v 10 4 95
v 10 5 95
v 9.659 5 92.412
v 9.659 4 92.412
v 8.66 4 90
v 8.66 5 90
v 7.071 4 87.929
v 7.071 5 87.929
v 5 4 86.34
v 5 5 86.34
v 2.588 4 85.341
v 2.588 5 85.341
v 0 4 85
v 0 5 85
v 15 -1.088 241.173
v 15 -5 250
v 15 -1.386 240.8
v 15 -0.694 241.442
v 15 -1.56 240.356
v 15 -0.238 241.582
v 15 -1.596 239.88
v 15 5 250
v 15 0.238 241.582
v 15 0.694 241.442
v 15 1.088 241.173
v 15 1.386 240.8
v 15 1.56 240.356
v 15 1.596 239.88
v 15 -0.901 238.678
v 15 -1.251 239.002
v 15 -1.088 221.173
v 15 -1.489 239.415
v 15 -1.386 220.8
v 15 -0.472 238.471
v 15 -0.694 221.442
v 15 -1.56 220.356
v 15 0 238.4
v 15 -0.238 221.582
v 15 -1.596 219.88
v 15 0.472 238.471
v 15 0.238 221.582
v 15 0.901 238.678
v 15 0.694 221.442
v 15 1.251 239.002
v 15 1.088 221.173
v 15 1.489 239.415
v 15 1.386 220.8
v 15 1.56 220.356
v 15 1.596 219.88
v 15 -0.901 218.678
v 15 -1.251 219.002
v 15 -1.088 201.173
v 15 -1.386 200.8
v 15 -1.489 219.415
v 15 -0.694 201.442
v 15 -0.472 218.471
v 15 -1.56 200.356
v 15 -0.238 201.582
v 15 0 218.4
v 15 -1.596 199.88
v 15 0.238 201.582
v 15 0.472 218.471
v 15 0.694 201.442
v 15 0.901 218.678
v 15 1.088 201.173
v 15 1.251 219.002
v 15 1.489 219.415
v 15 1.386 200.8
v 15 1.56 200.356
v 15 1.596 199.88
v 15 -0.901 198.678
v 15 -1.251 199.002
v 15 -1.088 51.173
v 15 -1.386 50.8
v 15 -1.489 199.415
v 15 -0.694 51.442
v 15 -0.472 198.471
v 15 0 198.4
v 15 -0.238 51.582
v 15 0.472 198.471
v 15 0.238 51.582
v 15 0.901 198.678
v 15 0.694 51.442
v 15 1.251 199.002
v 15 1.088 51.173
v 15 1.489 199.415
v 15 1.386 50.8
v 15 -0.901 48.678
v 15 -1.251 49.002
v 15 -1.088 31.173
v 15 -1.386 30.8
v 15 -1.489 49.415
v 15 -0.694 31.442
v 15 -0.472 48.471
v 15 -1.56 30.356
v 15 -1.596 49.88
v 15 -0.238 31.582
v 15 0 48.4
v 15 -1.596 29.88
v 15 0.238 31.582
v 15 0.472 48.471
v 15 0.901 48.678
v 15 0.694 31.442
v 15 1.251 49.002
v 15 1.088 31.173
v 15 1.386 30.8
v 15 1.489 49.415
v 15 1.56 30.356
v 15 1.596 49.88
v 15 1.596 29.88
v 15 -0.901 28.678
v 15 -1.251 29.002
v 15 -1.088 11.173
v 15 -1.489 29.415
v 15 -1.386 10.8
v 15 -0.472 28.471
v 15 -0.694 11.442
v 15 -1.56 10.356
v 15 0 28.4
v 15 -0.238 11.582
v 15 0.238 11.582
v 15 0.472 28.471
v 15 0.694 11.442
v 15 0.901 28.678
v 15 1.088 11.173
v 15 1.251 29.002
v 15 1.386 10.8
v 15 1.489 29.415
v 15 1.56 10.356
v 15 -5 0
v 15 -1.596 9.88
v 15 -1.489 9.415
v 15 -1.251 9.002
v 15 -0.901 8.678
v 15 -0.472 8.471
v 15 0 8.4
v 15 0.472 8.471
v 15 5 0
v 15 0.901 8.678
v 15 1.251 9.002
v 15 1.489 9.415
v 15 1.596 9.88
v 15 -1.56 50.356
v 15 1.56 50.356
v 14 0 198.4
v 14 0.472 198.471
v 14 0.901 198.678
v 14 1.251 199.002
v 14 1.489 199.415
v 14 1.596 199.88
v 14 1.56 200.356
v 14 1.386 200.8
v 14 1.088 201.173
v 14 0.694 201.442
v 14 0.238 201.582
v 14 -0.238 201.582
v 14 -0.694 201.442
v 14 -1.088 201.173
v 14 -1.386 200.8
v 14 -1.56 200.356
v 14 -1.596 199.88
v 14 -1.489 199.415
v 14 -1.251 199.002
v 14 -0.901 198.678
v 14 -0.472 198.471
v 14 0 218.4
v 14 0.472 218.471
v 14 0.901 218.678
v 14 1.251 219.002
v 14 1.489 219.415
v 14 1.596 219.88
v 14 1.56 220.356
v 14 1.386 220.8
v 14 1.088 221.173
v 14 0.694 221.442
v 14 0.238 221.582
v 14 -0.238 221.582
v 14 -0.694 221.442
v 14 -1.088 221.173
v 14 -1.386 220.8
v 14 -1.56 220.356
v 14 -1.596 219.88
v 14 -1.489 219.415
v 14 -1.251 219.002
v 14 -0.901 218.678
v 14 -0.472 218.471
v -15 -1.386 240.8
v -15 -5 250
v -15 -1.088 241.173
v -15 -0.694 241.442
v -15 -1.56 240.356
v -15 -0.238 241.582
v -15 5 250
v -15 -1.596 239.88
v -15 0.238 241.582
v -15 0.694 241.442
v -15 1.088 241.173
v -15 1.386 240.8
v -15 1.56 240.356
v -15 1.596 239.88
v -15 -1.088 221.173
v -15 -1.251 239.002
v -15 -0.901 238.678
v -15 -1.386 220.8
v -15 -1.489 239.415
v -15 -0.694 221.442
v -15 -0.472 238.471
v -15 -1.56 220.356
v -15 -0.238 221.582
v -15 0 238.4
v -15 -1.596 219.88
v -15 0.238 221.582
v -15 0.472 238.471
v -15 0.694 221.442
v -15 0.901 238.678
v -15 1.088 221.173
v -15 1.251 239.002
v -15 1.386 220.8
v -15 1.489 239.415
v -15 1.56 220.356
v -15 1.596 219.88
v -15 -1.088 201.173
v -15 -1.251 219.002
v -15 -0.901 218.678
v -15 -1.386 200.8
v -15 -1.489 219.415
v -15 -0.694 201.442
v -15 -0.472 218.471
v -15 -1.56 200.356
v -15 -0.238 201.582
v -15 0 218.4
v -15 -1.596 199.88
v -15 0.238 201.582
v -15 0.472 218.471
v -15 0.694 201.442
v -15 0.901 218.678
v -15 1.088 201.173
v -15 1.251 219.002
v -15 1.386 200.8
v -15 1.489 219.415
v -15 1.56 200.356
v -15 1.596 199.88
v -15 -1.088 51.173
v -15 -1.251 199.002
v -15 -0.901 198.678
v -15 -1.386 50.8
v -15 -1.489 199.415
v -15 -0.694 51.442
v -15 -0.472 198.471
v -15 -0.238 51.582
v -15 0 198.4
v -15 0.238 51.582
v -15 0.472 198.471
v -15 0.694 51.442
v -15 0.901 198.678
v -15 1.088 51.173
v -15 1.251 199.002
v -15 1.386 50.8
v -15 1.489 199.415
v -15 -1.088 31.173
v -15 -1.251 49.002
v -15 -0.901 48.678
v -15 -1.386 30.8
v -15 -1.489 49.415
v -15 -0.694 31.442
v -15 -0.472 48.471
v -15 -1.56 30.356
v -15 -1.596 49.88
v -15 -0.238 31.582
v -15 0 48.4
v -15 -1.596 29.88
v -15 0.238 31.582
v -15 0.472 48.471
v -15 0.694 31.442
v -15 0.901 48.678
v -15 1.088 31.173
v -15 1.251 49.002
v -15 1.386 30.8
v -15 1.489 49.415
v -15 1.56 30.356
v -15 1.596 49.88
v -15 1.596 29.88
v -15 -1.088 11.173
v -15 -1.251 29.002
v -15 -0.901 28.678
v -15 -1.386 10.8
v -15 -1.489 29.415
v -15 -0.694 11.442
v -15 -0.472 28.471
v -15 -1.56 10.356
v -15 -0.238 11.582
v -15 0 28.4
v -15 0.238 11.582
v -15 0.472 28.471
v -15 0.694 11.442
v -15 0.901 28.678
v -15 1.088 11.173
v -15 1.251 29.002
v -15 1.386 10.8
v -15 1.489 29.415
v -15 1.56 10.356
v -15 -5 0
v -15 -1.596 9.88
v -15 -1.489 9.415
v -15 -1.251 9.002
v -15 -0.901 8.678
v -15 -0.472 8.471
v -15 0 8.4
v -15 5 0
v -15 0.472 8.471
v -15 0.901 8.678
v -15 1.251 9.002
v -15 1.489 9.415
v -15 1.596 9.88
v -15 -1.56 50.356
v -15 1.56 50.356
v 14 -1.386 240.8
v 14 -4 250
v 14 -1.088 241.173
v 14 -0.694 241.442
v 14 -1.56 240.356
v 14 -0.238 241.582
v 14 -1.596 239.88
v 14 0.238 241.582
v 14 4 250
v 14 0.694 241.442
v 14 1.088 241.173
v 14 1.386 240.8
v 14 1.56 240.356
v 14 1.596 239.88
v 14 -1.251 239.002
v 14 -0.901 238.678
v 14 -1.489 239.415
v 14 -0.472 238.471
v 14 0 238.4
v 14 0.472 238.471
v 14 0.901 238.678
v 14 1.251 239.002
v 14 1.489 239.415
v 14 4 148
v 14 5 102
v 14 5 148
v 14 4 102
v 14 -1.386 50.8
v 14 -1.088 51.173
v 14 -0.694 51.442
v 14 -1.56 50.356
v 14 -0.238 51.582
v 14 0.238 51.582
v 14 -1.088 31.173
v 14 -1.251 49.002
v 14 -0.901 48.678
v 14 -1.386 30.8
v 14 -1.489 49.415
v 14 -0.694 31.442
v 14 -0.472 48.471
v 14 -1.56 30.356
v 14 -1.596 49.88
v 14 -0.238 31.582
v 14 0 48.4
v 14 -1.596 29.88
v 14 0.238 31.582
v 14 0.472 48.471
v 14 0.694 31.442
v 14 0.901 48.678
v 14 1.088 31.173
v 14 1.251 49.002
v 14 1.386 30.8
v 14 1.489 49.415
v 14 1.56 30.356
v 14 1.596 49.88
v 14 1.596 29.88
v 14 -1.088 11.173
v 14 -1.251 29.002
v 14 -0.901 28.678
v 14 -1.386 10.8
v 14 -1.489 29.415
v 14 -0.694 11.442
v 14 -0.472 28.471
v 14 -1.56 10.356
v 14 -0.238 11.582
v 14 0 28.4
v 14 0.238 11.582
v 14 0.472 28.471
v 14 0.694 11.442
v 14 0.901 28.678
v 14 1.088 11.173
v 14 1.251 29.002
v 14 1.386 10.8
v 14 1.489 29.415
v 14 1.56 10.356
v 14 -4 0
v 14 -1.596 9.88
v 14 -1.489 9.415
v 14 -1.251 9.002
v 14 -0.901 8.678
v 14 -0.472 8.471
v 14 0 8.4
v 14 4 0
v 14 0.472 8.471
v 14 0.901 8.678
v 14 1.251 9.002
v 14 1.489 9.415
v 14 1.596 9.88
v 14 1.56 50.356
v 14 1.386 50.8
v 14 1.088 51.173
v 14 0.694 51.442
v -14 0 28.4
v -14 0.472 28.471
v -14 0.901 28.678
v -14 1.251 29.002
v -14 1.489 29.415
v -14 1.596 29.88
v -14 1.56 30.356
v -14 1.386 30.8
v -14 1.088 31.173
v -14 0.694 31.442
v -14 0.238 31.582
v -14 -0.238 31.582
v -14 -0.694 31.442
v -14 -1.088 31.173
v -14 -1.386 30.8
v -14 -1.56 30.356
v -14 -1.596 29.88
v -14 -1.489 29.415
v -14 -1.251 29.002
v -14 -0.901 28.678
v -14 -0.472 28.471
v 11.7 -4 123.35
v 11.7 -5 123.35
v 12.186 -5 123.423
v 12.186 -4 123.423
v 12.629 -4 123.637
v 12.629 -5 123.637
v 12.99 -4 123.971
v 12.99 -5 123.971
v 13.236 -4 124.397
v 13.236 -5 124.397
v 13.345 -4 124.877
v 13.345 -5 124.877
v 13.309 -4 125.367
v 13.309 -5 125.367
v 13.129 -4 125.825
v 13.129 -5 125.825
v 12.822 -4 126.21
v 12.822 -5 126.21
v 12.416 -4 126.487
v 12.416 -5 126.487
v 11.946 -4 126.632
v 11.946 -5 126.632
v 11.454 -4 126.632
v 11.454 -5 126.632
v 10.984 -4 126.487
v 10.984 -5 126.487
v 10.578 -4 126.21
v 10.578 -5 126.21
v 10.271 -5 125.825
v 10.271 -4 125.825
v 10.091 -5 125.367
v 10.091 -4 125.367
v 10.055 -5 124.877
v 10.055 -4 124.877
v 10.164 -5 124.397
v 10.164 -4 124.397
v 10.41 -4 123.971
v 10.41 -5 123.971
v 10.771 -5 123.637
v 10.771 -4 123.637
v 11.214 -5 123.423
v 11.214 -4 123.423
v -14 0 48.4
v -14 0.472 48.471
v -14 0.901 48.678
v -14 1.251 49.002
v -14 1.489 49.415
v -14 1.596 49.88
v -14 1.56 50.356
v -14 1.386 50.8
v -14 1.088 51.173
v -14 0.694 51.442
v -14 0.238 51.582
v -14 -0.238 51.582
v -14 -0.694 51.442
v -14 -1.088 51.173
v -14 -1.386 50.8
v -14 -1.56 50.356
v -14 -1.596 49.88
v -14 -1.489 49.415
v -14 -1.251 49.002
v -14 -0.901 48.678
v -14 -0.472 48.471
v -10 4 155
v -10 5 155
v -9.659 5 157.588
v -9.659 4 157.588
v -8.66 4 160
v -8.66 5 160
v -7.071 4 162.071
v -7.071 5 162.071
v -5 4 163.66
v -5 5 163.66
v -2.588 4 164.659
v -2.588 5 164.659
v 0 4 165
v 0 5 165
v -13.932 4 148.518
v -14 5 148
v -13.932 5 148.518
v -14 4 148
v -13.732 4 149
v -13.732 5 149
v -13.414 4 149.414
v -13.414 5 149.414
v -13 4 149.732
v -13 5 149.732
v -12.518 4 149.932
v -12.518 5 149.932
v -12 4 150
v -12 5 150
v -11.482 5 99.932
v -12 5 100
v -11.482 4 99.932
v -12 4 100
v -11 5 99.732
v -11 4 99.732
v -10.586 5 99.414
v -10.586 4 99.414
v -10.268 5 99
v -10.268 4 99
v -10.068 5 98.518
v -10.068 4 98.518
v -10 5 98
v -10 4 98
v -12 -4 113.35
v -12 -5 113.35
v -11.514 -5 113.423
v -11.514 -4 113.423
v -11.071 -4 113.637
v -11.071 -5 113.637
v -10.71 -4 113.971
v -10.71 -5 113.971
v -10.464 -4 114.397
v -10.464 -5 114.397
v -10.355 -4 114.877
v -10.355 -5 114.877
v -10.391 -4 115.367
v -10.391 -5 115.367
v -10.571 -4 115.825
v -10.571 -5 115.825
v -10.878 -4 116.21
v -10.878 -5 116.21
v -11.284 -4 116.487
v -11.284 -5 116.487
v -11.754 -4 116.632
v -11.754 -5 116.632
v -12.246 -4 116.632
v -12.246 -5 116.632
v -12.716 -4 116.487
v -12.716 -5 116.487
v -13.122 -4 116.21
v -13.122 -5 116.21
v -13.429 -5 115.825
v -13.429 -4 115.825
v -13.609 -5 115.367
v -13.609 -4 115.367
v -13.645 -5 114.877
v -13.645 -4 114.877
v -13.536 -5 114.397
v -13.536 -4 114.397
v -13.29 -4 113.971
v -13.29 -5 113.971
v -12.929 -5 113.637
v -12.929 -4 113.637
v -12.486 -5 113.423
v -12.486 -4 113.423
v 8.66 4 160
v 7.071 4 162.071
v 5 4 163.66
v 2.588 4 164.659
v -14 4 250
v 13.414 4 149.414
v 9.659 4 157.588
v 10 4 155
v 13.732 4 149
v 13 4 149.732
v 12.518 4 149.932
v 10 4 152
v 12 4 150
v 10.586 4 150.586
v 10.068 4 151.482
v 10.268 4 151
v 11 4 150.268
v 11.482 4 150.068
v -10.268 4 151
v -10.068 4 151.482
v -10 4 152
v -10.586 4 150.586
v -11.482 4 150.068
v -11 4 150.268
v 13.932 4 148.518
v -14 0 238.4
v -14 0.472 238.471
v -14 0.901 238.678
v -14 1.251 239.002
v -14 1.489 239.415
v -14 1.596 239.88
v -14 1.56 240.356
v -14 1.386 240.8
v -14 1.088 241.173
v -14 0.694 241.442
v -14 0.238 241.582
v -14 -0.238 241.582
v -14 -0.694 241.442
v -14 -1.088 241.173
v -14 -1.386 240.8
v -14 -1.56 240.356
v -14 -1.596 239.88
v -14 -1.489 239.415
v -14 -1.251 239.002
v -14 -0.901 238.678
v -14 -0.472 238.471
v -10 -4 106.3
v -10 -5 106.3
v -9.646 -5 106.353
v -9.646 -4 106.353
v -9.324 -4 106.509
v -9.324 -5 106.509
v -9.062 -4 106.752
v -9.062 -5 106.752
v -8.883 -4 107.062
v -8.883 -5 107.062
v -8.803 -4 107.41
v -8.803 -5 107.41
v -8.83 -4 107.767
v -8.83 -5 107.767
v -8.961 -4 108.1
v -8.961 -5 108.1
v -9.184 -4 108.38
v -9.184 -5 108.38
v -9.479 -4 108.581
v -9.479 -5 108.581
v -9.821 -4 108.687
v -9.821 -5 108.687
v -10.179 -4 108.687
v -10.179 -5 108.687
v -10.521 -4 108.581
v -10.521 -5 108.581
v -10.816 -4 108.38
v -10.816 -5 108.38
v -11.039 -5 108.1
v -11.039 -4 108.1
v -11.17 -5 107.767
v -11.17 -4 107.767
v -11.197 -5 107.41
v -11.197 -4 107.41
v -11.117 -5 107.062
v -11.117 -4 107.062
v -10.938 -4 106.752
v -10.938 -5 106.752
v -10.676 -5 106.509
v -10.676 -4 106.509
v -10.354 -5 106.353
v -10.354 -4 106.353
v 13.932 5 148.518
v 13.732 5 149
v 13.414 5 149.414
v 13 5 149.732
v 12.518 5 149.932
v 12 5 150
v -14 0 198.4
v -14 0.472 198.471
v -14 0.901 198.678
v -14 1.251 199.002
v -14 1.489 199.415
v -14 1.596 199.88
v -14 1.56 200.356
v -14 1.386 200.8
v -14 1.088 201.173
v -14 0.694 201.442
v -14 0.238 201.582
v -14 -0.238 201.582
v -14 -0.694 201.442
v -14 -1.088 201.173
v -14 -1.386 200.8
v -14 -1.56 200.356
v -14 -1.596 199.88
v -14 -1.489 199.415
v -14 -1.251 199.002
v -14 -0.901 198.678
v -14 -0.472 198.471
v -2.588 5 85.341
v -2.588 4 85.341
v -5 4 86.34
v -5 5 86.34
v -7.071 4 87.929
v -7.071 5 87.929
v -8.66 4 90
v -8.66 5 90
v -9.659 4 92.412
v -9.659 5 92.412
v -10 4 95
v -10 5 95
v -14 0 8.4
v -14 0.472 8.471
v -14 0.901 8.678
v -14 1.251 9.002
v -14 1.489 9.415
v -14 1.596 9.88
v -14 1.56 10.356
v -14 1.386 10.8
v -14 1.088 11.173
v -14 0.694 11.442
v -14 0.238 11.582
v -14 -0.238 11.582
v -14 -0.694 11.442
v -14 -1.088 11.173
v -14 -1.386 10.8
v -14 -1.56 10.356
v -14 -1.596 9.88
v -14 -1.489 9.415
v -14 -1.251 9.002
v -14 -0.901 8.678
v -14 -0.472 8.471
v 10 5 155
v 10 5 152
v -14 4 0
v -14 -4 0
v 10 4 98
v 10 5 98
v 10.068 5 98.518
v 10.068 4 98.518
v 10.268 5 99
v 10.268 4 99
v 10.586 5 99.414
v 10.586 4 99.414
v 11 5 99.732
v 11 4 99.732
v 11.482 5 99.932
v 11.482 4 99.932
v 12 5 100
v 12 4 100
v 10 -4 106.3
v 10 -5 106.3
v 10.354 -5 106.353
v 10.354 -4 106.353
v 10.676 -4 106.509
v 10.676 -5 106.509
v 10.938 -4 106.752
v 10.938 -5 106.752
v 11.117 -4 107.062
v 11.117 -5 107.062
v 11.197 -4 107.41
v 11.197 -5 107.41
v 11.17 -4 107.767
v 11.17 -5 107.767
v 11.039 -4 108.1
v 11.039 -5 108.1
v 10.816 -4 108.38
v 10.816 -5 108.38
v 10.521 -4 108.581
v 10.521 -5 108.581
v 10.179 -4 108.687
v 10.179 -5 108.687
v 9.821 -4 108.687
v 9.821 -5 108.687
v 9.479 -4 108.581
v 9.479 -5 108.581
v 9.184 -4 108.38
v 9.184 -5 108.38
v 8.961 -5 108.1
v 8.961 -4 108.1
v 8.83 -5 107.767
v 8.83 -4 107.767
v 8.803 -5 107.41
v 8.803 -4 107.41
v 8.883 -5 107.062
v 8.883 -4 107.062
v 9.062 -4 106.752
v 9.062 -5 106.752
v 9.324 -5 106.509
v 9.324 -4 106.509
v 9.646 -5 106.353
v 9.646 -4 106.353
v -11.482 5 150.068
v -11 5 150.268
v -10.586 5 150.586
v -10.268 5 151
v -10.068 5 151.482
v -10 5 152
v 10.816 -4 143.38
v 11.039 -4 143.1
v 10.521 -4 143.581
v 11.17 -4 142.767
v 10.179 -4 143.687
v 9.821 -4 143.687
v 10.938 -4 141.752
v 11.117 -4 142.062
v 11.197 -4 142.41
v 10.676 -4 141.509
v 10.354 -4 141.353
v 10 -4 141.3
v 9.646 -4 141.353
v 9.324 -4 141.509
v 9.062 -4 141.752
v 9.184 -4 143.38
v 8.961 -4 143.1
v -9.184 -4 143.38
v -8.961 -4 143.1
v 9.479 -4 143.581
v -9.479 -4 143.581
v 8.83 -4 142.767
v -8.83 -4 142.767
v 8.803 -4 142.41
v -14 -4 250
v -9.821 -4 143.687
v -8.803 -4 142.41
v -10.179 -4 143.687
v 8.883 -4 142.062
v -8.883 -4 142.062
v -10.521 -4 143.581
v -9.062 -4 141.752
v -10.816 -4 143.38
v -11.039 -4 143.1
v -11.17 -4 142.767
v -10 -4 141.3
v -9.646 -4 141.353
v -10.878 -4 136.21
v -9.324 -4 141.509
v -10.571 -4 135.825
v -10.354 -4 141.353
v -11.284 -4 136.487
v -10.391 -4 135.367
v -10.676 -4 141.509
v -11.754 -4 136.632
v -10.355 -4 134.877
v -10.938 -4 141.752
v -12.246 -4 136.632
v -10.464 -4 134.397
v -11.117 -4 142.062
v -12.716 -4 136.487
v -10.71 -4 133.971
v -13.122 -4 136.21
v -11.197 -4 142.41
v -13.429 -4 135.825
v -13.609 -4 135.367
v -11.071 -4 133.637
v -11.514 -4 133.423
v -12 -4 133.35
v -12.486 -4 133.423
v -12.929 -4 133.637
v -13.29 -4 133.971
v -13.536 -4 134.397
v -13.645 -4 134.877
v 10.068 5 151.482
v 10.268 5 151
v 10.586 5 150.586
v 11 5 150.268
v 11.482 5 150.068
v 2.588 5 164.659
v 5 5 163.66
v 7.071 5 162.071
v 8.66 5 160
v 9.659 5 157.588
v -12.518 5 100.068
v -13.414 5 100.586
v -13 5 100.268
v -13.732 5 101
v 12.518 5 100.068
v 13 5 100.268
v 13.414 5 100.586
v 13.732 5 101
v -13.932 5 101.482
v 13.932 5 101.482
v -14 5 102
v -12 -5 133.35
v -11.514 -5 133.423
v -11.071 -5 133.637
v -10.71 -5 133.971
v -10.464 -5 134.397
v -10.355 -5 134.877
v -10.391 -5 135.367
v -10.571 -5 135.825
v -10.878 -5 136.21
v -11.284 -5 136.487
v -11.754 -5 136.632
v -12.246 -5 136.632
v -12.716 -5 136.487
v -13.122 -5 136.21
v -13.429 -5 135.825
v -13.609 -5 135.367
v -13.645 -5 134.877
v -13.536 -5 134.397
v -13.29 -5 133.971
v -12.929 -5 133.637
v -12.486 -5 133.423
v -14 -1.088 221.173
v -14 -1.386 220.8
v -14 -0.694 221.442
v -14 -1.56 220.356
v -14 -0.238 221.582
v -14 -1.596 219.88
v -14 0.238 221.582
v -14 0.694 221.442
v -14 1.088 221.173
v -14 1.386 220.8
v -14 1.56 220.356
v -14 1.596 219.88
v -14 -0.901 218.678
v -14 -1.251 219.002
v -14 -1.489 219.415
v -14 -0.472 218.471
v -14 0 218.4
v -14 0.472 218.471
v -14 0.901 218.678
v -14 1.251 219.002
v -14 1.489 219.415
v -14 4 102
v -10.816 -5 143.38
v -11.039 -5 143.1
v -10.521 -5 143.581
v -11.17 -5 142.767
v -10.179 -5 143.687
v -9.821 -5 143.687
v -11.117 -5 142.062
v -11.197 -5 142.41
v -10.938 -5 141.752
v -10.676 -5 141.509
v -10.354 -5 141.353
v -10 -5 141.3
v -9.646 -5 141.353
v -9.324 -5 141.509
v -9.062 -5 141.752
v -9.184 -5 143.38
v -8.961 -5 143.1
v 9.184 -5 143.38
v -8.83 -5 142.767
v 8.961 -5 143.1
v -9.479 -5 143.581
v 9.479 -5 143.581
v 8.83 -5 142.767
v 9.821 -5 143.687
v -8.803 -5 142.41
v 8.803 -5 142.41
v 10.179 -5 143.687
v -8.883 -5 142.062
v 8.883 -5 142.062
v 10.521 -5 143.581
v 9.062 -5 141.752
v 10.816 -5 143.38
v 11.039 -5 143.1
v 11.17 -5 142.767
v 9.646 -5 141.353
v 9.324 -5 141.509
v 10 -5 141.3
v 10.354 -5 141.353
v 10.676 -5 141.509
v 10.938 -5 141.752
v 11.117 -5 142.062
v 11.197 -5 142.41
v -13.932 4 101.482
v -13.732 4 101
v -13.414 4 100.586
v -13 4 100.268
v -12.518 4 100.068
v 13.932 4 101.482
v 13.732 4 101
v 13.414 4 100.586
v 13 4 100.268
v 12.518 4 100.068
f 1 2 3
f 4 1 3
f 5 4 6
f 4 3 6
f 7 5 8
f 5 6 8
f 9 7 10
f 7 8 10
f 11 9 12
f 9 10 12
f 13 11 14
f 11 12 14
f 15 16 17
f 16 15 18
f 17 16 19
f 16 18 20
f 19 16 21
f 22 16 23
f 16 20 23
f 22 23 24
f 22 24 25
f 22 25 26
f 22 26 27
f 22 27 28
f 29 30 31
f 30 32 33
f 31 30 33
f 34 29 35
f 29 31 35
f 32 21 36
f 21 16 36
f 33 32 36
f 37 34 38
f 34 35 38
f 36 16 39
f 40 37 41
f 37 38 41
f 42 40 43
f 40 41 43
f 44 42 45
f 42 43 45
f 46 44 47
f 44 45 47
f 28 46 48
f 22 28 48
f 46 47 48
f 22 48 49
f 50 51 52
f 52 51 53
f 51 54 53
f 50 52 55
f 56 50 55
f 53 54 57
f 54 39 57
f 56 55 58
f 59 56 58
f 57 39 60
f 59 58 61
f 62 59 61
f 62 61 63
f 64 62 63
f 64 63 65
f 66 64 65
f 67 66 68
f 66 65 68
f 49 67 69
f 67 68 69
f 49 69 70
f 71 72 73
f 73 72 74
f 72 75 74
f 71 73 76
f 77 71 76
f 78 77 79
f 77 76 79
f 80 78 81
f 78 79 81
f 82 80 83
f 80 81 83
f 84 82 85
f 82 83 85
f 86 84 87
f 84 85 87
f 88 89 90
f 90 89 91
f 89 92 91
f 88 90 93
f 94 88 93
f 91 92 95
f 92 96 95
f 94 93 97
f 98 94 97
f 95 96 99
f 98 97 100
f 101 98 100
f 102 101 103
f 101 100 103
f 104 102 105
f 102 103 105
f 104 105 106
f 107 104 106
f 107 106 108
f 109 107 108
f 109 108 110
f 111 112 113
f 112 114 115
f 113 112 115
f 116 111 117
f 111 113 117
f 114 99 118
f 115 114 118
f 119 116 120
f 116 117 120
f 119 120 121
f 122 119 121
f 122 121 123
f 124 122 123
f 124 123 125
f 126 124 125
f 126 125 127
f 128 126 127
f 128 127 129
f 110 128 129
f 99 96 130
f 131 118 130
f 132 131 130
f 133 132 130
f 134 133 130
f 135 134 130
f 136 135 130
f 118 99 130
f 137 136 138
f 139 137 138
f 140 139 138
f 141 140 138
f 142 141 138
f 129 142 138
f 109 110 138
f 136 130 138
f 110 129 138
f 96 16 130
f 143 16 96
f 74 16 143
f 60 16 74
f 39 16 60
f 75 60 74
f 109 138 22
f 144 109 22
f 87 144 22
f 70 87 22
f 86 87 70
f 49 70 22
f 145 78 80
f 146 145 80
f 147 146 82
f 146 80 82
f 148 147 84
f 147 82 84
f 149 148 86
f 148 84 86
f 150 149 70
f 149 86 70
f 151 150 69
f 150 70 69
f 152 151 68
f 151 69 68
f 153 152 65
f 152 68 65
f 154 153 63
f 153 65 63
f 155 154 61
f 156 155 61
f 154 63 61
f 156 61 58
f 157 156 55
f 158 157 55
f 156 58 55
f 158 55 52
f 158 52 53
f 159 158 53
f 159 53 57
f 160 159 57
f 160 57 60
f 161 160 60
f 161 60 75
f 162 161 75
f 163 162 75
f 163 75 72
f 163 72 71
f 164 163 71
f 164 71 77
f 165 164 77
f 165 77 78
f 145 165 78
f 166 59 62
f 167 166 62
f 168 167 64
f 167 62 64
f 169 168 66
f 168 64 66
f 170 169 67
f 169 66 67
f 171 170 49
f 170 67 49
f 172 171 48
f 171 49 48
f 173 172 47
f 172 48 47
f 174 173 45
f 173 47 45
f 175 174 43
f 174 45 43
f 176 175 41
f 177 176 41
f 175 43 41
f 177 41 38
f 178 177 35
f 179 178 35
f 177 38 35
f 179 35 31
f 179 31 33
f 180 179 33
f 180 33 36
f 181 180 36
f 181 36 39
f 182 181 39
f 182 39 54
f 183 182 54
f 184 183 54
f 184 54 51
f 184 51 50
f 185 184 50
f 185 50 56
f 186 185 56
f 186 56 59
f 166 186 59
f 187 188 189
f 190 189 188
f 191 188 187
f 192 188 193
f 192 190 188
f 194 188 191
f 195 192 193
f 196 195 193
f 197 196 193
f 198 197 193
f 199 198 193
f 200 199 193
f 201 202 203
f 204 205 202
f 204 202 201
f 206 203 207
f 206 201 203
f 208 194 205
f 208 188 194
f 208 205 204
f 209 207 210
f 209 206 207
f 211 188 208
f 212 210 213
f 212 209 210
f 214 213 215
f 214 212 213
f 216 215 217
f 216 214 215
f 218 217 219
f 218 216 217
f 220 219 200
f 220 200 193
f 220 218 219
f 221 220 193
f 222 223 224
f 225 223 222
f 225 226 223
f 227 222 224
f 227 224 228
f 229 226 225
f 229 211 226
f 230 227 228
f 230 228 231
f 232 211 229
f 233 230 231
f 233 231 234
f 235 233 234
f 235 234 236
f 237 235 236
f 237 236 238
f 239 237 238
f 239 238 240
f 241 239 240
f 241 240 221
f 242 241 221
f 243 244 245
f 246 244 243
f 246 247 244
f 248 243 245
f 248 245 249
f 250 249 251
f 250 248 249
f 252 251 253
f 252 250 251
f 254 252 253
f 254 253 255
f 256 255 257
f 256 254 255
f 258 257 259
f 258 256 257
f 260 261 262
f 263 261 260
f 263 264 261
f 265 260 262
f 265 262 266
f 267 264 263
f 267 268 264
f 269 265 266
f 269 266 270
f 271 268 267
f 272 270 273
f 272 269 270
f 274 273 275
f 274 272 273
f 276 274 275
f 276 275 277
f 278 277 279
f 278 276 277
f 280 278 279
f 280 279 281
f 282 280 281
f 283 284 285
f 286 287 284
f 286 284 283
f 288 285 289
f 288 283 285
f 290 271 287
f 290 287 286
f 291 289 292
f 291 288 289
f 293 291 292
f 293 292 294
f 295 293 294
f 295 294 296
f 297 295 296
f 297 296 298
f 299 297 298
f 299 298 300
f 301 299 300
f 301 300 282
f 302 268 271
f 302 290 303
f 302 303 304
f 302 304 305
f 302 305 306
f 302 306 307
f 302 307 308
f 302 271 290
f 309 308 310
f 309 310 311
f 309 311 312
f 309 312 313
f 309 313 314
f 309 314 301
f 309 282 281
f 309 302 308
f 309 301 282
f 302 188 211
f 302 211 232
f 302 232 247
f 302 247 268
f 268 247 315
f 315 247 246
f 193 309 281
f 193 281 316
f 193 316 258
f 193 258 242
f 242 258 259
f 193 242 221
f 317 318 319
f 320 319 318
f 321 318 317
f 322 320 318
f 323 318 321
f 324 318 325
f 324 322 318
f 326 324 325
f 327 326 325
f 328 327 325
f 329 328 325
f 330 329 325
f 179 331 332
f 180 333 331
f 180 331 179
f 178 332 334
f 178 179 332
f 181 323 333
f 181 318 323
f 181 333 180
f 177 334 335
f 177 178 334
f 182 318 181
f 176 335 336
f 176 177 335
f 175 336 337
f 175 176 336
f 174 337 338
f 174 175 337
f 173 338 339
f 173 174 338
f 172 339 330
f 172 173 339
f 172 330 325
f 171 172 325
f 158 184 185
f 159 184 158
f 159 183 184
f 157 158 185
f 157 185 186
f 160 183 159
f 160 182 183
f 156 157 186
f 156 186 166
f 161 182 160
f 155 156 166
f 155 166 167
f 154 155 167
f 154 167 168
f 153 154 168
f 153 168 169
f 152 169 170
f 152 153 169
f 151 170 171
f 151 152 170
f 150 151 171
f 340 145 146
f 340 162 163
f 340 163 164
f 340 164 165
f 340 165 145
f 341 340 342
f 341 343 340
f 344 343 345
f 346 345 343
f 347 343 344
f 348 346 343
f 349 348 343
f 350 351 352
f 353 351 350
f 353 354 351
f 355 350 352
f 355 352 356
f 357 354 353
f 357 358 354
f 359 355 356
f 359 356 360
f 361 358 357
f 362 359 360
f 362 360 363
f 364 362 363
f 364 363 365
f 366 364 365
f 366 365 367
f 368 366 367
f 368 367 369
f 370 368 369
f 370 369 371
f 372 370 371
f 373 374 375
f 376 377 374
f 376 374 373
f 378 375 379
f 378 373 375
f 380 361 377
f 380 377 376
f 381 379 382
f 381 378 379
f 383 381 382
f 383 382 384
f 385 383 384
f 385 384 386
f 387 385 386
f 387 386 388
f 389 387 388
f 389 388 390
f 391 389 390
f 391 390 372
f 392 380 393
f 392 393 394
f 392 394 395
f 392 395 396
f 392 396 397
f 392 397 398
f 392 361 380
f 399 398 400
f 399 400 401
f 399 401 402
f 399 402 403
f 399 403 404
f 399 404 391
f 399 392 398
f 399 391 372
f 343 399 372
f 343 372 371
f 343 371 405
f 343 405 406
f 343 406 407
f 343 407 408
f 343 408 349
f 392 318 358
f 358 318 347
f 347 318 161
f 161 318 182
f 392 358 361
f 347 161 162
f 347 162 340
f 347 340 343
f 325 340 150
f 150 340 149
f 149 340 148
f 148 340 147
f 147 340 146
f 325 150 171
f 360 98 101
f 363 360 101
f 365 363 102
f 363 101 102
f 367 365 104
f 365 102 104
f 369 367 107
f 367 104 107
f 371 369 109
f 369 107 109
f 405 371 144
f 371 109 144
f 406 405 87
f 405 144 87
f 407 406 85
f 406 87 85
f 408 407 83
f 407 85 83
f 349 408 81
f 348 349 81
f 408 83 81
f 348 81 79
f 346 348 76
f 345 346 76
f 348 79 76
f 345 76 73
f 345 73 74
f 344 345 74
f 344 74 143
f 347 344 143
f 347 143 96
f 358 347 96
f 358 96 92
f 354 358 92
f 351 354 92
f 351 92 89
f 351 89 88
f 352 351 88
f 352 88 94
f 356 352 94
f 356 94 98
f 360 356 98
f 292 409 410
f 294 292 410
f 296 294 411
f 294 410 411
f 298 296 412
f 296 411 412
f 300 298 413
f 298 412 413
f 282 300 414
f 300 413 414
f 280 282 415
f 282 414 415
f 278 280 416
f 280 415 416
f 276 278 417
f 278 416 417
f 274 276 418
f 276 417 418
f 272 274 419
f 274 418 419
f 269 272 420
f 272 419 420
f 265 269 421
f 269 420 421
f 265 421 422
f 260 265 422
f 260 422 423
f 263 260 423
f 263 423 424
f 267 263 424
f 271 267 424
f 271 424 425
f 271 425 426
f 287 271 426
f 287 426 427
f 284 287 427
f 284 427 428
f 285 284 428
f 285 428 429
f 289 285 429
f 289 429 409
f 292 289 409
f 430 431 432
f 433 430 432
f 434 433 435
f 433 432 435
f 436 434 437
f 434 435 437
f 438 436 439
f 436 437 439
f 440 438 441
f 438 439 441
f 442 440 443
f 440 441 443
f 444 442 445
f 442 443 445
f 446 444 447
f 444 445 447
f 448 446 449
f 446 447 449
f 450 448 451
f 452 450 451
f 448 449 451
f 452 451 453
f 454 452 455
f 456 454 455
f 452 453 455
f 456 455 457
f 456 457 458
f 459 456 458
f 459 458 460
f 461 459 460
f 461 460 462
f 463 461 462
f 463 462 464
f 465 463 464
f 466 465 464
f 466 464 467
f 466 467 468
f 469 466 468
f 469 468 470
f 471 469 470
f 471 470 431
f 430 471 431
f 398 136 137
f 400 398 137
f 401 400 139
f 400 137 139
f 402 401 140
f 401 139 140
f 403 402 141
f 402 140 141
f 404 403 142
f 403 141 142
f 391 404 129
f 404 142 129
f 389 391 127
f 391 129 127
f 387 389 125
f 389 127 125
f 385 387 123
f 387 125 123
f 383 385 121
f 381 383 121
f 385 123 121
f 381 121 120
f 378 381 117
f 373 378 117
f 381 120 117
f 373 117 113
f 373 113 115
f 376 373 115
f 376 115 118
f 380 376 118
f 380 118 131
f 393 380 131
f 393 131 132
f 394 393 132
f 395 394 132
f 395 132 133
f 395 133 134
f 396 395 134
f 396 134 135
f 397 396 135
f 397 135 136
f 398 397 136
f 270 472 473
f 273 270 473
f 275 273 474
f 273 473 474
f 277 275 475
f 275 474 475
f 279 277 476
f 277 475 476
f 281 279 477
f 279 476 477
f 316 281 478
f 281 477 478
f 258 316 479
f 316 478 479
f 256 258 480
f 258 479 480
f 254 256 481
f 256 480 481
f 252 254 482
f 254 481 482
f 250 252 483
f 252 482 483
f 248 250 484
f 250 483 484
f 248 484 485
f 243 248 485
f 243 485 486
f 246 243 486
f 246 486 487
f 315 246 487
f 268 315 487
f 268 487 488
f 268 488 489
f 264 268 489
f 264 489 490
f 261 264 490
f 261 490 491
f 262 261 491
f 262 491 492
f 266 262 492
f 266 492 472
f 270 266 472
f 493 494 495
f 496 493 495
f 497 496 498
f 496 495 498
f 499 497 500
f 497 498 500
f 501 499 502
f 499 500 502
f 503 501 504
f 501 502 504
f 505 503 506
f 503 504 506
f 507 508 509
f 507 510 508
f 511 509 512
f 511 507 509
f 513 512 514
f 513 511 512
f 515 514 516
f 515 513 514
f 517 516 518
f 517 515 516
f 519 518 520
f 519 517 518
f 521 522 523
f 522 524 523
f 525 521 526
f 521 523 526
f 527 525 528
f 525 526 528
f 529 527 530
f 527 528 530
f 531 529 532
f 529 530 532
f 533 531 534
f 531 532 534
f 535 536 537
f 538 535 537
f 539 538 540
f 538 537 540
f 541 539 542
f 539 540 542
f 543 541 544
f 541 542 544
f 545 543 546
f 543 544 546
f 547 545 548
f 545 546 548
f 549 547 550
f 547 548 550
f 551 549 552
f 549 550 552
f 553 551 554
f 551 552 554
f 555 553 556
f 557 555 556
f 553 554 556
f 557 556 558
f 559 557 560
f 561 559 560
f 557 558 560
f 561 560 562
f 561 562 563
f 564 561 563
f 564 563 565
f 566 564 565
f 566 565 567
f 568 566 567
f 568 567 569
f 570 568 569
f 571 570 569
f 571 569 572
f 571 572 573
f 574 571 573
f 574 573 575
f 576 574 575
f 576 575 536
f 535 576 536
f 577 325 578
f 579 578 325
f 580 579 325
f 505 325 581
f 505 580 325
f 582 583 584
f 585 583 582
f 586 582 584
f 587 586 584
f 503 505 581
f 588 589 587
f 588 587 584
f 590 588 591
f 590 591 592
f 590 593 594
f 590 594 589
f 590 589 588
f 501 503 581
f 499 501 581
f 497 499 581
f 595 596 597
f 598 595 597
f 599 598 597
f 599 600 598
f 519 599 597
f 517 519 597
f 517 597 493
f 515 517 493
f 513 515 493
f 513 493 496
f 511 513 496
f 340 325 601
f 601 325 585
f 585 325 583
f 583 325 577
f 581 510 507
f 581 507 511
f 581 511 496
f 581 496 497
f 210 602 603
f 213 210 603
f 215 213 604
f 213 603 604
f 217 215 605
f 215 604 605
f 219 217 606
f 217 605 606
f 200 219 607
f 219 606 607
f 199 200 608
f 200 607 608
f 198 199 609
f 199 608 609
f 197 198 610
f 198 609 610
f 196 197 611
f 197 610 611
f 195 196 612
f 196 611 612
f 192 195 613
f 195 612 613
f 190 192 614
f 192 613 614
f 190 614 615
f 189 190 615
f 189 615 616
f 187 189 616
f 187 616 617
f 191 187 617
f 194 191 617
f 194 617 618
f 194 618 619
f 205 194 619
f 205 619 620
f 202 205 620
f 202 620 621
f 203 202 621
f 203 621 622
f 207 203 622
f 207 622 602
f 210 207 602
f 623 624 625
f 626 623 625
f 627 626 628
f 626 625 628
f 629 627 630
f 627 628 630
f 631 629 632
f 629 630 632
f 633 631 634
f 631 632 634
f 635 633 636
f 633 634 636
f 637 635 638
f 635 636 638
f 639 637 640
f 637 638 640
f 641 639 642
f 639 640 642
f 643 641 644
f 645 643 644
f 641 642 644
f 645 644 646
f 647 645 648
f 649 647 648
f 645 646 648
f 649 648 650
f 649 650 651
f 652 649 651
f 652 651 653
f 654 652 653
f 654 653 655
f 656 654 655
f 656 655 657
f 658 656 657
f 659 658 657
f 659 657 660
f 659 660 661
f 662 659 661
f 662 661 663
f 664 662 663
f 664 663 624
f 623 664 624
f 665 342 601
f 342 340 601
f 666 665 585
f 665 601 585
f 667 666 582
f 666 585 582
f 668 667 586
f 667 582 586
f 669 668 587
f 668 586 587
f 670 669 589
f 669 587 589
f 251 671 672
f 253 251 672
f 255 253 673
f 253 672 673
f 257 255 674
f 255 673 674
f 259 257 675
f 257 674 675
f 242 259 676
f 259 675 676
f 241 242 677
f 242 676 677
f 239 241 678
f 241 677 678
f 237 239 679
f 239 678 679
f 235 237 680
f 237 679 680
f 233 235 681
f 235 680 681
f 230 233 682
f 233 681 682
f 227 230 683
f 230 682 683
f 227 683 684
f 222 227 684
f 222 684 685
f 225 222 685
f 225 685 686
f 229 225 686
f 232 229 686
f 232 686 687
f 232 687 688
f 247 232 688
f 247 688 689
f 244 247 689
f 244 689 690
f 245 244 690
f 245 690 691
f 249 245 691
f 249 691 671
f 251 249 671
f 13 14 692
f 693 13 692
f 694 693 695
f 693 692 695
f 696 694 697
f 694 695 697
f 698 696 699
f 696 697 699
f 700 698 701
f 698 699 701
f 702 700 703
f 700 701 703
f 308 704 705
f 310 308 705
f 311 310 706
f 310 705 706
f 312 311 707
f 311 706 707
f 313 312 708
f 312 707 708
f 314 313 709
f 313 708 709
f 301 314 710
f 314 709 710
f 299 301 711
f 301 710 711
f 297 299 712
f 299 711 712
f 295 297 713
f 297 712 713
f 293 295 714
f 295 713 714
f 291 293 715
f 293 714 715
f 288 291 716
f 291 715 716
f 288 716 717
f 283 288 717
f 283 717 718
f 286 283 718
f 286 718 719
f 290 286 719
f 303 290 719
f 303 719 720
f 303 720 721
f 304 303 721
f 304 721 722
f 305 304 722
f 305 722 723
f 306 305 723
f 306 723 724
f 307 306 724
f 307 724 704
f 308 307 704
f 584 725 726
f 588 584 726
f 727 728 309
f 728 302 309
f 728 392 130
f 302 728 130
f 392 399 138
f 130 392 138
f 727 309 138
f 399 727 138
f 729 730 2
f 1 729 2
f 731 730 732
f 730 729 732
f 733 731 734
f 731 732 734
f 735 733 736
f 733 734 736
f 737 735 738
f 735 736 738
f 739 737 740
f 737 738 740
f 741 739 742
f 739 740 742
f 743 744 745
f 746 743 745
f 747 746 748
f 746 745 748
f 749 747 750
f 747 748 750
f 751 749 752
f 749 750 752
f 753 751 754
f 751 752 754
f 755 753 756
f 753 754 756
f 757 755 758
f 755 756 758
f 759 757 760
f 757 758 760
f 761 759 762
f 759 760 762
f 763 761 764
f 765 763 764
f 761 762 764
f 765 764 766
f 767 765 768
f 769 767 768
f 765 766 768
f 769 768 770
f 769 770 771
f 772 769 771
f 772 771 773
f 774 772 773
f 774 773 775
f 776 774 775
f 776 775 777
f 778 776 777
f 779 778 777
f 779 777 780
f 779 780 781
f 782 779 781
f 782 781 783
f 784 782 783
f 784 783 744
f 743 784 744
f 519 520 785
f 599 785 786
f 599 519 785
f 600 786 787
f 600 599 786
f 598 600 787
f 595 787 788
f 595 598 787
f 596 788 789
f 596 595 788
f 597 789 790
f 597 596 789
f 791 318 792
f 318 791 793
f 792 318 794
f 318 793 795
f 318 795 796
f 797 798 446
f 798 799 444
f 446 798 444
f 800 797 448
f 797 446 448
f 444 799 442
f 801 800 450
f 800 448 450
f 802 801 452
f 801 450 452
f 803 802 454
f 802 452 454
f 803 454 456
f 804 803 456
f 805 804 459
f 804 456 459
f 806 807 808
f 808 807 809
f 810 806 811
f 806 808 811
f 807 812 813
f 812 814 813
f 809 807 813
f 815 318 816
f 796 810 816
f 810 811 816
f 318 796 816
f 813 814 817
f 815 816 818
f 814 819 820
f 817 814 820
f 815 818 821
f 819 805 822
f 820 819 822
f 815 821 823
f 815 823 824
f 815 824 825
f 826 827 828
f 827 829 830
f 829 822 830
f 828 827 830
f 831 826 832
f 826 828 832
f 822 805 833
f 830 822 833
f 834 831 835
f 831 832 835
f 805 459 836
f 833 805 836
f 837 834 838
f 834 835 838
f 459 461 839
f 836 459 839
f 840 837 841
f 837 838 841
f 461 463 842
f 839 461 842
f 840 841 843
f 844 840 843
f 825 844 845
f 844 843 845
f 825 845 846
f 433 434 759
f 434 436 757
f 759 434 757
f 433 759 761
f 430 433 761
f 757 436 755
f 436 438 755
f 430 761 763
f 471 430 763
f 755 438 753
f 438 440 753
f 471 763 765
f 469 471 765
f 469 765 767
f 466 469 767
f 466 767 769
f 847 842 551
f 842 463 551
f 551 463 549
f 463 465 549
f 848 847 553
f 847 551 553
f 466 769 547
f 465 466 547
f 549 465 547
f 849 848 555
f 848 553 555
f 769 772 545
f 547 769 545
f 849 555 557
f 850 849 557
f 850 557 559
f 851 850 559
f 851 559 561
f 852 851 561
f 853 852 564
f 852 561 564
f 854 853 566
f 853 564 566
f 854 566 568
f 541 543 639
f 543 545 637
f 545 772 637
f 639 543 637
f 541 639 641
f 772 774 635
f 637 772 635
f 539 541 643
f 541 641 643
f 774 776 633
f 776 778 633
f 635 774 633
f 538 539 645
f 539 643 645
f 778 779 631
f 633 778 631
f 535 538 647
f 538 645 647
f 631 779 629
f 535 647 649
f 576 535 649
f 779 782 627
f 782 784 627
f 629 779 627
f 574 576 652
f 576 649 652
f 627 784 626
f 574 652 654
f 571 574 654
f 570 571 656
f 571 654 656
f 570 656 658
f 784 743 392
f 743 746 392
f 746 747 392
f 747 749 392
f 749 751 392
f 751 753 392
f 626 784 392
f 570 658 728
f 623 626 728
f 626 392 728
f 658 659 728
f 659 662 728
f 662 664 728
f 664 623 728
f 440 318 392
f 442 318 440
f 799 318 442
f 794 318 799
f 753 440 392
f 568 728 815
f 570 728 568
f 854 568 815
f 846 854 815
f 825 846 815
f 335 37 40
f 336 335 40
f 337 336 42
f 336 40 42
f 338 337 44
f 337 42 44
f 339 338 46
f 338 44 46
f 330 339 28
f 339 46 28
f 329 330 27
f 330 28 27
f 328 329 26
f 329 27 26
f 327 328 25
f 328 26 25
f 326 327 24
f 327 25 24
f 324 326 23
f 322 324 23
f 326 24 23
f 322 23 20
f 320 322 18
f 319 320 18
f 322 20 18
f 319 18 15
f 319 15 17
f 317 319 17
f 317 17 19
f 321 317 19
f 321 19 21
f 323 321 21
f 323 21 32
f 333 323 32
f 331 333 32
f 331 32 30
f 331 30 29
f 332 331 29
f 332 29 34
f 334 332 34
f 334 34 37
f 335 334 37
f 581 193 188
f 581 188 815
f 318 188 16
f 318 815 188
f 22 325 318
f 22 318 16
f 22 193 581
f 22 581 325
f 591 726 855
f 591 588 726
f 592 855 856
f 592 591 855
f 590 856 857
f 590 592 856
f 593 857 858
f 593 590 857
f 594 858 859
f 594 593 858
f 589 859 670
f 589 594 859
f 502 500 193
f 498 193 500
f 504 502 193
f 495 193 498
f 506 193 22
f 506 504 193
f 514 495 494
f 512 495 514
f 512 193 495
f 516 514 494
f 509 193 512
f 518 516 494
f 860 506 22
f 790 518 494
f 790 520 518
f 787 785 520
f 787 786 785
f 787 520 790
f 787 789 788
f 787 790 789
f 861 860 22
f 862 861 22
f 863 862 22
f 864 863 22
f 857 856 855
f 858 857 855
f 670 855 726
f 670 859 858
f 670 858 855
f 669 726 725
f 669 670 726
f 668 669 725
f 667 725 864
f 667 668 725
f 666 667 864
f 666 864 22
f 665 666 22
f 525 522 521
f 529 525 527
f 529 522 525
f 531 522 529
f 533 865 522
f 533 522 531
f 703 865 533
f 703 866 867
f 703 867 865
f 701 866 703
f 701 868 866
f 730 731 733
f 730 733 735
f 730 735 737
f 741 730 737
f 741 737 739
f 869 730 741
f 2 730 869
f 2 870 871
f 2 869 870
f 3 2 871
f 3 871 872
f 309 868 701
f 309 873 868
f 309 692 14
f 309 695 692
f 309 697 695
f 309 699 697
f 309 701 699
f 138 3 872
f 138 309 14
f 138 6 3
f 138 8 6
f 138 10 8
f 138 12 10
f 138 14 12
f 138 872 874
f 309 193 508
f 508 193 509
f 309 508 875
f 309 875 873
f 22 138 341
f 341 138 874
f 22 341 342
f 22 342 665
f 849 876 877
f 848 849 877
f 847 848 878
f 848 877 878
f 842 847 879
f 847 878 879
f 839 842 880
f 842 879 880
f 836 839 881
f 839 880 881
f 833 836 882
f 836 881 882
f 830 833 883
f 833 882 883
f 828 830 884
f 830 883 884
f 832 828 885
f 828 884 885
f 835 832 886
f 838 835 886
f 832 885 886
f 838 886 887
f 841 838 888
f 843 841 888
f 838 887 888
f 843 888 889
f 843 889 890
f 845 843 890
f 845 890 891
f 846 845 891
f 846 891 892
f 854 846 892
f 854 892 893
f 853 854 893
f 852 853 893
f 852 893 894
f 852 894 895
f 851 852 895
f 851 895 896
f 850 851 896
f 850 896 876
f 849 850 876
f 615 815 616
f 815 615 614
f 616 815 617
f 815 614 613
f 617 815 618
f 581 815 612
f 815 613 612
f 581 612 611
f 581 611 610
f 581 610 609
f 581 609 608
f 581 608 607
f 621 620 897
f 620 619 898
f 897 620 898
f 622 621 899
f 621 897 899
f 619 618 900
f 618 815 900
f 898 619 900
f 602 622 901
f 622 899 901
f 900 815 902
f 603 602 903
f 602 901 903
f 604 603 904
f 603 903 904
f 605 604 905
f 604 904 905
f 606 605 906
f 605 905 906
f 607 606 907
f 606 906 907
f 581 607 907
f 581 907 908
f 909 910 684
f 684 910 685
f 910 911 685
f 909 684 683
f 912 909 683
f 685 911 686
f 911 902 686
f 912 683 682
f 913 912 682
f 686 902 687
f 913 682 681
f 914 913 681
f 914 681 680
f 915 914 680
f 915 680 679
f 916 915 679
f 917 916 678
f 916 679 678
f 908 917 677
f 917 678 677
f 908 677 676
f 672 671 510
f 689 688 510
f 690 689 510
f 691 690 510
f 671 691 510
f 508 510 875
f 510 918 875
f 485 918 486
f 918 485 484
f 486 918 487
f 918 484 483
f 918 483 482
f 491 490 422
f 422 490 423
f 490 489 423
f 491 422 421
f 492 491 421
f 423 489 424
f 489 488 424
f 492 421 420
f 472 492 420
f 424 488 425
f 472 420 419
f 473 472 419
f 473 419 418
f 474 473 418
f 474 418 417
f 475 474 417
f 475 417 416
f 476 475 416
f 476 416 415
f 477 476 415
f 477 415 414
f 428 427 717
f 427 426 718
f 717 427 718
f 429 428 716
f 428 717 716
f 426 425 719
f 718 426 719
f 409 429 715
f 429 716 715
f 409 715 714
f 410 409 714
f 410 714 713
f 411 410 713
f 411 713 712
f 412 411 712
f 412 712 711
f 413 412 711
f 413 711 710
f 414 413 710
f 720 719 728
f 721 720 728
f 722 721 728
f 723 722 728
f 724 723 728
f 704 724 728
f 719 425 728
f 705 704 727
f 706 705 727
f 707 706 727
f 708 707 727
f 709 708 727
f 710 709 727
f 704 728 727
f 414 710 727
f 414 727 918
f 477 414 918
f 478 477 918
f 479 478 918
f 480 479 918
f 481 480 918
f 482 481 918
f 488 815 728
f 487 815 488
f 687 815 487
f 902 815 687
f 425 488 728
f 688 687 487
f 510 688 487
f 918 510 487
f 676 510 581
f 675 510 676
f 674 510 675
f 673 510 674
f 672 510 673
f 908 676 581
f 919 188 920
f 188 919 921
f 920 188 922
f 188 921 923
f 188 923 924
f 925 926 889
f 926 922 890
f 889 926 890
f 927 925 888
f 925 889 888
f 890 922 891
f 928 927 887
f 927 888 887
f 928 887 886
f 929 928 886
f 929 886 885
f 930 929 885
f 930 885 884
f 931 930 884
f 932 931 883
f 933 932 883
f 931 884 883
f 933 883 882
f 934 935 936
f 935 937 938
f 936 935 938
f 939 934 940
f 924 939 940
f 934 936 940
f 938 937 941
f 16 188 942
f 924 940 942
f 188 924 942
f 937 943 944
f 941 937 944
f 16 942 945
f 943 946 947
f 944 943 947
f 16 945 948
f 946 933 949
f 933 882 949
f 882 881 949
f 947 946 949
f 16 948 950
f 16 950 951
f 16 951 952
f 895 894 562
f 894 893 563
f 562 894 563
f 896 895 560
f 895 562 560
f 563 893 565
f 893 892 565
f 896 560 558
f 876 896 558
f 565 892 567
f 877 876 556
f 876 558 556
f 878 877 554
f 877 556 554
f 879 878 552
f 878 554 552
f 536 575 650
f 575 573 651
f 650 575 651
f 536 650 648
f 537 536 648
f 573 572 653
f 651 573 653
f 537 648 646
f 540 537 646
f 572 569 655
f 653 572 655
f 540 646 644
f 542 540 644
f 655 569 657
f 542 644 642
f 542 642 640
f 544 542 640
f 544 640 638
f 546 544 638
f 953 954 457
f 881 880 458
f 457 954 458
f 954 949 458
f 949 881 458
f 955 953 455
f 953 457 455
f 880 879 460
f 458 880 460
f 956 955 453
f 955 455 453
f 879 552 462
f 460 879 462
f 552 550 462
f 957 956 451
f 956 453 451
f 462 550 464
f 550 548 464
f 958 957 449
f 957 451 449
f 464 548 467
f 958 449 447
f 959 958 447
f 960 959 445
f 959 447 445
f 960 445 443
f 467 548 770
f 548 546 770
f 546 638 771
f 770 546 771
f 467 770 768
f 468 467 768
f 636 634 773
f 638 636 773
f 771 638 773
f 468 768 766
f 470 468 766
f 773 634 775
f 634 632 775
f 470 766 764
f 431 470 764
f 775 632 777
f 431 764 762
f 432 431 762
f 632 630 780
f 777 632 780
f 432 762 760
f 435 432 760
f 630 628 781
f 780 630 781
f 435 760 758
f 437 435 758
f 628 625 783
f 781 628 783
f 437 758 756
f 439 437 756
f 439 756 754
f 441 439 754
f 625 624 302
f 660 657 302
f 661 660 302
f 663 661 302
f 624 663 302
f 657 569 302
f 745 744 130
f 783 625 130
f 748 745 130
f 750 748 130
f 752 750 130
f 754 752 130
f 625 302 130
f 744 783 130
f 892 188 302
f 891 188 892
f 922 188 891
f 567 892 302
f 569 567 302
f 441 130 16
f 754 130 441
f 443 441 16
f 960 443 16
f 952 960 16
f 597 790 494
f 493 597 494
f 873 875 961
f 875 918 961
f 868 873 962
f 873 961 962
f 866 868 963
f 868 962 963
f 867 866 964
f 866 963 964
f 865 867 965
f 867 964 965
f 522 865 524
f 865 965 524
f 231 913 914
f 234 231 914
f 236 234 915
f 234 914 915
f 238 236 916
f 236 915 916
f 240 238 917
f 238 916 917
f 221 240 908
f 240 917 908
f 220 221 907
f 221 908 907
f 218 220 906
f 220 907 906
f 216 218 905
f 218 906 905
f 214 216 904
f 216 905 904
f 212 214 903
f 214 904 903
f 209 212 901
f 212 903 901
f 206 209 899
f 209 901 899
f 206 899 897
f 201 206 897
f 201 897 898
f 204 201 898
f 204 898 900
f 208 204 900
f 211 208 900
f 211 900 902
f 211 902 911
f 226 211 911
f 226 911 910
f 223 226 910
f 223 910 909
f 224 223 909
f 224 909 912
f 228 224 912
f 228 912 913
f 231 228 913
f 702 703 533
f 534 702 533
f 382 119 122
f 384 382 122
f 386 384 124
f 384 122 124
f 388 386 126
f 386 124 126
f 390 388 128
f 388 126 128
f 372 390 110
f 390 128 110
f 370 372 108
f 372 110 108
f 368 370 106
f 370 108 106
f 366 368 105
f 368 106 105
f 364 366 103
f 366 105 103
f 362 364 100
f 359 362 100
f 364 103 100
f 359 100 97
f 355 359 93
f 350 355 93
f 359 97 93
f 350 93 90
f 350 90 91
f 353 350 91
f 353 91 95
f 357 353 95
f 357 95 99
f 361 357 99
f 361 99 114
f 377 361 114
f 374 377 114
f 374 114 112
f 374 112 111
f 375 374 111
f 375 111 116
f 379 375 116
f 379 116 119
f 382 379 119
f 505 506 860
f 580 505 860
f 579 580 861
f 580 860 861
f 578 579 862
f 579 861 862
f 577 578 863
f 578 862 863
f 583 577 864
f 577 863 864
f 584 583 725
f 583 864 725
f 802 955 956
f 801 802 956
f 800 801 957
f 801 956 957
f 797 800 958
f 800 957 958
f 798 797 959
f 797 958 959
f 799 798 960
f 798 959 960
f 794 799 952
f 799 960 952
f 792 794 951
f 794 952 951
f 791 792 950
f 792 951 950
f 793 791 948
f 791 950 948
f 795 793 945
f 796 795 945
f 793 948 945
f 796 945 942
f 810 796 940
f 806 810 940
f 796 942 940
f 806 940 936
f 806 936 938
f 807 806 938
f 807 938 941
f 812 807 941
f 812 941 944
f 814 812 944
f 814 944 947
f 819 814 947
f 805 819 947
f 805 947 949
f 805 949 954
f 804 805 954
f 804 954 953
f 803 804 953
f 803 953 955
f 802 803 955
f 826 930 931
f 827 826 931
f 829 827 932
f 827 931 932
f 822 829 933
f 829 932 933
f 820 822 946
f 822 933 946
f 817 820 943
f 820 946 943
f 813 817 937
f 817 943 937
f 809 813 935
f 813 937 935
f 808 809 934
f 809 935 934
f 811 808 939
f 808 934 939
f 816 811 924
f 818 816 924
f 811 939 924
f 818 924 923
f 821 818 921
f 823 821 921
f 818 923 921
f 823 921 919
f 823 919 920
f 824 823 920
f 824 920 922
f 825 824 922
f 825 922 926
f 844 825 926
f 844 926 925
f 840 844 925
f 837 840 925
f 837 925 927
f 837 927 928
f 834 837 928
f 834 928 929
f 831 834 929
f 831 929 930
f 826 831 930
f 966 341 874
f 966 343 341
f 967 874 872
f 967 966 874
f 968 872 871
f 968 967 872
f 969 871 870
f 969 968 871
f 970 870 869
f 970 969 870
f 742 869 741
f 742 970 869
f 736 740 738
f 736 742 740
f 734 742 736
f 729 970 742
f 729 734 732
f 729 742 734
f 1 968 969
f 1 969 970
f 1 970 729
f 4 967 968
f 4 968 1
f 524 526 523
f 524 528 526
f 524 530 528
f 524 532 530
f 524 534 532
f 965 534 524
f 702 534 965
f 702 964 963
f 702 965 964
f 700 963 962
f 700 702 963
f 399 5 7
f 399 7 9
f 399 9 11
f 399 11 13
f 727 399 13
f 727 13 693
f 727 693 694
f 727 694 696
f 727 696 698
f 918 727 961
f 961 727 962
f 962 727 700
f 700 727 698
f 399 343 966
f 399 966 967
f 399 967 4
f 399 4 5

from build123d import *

# Parameters (mm, degrees)
SKETCH_1_W          = 30
SKETCH_1_H          = 10
SKETCH_1_W_2        = 27
SKETCH_1_H_2        = 7
EXTRUDE_1_DEPTH     = 250
SKETCH_2_R          = 1.6
CUT_EXTRUDE_1_DEPTH = 252.843205189
SKETCH_6_W          = 28
SKETCH_6_H          = 8
CUT_EXTRUDE_5_DEPTH = 330
SKETCH_8_W          = 4
SKETCH_8_H          = 25
CUT_EXTRUDE_6_DEPTH = 5
SKETCH_10_R         = 1.65
SKETCH_10_W         = 40
SKETCH_10_H         = 39.7
CUT_EXTRUDE_7_DEPTH = 25
FILLET_1_R          = 2
SKETCH_11_R         = 1.2
CUT_EXTRUDE_8_DEPTH = 25


with BuildPart() as part:
    # 草图1 → 凸台-拉伸1 (new body)
    with BuildSketch(Plane.XY):
        Rectangle(SKETCH_1_W, SKETCH_1_H)
        Rectangle(SKETCH_1_W_2, SKETCH_1_H_2, mode=Mode.SUBTRACT)
    extrude(amount=EXTRUDE_1_DEPTH)

    # 草图2 → 切除-拉伸1 (cut, through all)
    with BuildSketch(Plane(origin=(15, 0, 0), x_dir=(0, 0, -1), z_dir=(1, 0, 0))):
        with Locations((-240, 0)):
            Circle(SKETCH_2_R)
        with Locations((-220, 0)):
            Circle(SKETCH_2_R)
        with Locations((-200, 0)):
            Circle(SKETCH_2_R)
        with Locations((-50, 0)):
            Circle(SKETCH_2_R)
        with Locations((-30, 0)):
            Circle(SKETCH_2_R)
        with Locations((-10, 0)):
            Circle(SKETCH_2_R)
    extrude(amount=-CUT_EXTRUDE_1_DEPTH, mode=Mode.SUBTRACT)

    # 草图6 → 切除-拉伸5 (cut)
    with BuildSketch(Plane(origin=(0, 0, 0), x_dir=(-1, 0, 0), z_dir=(0, 0, -1))):
        Rectangle(SKETCH_6_W, SKETCH_6_H)
    extrude(amount=-CUT_EXTRUDE_5_DEPTH, mode=Mode.SUBTRACT)

    # 草图8 → 切除-拉伸6 (cut)
    with BuildSketch(Plane(origin=(0, 5, 0), x_dir=(1, 0, 0), z_dir=(0, 1, 0))):
        with BuildLine():
            Line((-10, -150), (-10, -155))
            ThreePointArc((-10, -155), (-7.071067812, -162.071067812), (0, -165))
            Line((0, -165), (0, -85))
            ThreePointArc((0, -85), (-7.071067812, -87.928932188), (-10, -95))
            Line((-10, -95), (-10, -100))
            Line((-10, -100), (-10, -125))
            Line((-10, -125), (-10, -150))
        make_face()
        with BuildLine():
            Line((0, -85), (0, -165))
            ThreePointArc((0, -165), (7.071067812, -162.071067812), (10, -155))
            Line((10, -155), (10, -150))
            Line((10, -150), (10, -125))
            Line((10, -125), (10, -100))
            Line((10, -100), (10, -95))
            ThreePointArc((10, -95), (7.071067812, -87.928932188), (0, -85))
        make_face()
        with Locations((12, -112.5)):
            Rectangle(SKETCH_8_W, SKETCH_8_H)
        with Locations((12, -137.5)):
            Rectangle(SKETCH_8_W, SKETCH_8_H)
        with Locations((-12, -112.5)):
            Rectangle(SKETCH_8_W, SKETCH_8_H)
        with Locations((-12, -137.5)):
            Rectangle(SKETCH_8_W, SKETCH_8_H)
    extrude(amount=-CUT_EXTRUDE_6_DEPTH, mode=Mode.SUBTRACT)

    # 草图10 → 切除-拉伸7 (cut)
    # profile 1 of 4: a face of its own
    with BuildSketch(Plane.XZ.offset(5)):
        with Locations(Location((-12, 115, 0), (0, 0, 270))):
            Circle(SKETCH_10_R)
    # profile 2 of 4: a face of its own
    with BuildSketch(Plane.XZ.offset(5)):
        with Locations(Location((-12, 135, 0), (0, 0, 270))):
            Circle(SKETCH_10_R)
    # profile 3 of 4: a face of its own
    with BuildSketch(Plane.XZ.offset(5)):
        with Locations(Location((11.7, 125, 0), (0, 0, 270))):
            Circle(SKETCH_10_R)
    # profile 4 of 4: a face of its own
    with BuildSketch(Plane.XZ.offset(5)):
        with Locations((-84.485896168, 54.669789624)):
            Rectangle(SKETCH_10_W, SKETCH_10_H)
        with Locations((-84.485896168, 42.819789624)):
            Circle(SKETCH_10_R, mode=Mode.SUBTRACT)
        with Locations((-94.485896168, 66.519789624)):
            Circle(SKETCH_10_R, mode=Mode.SUBTRACT)
        with Locations((-74.485896168, 66.519789624)):
            Circle(SKETCH_10_R, mode=Mode.SUBTRACT)
    extrude(amount=-CUT_EXTRUDE_7_DEPTH, mode=Mode.SUBTRACT)

    # 圆角1
    fillet_1_edges = [part.edges().sort_by_distance(p)[0] for p in [
        (-14, 4.5, 150),
        (14, 4.5, 150),
        (14, 4.5, 100),
        (-14, 4.5, 100),
    ]]
    fillet(fillet_1_edges, radius=FILLET_1_R)
    fillet_1_2_edges = [part.edges().sort_by_distance(p)[0] for p in [
        (10, 4.5, 100),
        (-10, 4.5, 100),
        (-10, 4.5, 150),
        (10, 4.5, 150),
    ]]
    fillet(fillet_1_2_edges, radius=FILLET_1_R - 0.0001)  # a hair under: the kernel refuses the full size

    # 草图11 → 切除-拉伸8 (cut)
    with BuildSketch(Plane.XZ.offset(5)):
        with Locations(Location((-10, 142.5, 0), (0, 0, 270))):
            Circle(SKETCH_11_R)
        with Locations(Location((10, 142.5, 0), (0, 0, 270))):
            Circle(SKETCH_11_R)
        with Locations(Location((10, 107.5, 0), (0, 0, 270))):
            Circle(SKETCH_11_R)
        with Locations(Location((-10, 107.5, 0), (0, 0, 270))):
            Circle(SKETCH_11_R)
    extrude(amount=-CUT_EXTRUDE_8_DEPTH, mode=Mode.SUBTRACT)


solid = part.part
